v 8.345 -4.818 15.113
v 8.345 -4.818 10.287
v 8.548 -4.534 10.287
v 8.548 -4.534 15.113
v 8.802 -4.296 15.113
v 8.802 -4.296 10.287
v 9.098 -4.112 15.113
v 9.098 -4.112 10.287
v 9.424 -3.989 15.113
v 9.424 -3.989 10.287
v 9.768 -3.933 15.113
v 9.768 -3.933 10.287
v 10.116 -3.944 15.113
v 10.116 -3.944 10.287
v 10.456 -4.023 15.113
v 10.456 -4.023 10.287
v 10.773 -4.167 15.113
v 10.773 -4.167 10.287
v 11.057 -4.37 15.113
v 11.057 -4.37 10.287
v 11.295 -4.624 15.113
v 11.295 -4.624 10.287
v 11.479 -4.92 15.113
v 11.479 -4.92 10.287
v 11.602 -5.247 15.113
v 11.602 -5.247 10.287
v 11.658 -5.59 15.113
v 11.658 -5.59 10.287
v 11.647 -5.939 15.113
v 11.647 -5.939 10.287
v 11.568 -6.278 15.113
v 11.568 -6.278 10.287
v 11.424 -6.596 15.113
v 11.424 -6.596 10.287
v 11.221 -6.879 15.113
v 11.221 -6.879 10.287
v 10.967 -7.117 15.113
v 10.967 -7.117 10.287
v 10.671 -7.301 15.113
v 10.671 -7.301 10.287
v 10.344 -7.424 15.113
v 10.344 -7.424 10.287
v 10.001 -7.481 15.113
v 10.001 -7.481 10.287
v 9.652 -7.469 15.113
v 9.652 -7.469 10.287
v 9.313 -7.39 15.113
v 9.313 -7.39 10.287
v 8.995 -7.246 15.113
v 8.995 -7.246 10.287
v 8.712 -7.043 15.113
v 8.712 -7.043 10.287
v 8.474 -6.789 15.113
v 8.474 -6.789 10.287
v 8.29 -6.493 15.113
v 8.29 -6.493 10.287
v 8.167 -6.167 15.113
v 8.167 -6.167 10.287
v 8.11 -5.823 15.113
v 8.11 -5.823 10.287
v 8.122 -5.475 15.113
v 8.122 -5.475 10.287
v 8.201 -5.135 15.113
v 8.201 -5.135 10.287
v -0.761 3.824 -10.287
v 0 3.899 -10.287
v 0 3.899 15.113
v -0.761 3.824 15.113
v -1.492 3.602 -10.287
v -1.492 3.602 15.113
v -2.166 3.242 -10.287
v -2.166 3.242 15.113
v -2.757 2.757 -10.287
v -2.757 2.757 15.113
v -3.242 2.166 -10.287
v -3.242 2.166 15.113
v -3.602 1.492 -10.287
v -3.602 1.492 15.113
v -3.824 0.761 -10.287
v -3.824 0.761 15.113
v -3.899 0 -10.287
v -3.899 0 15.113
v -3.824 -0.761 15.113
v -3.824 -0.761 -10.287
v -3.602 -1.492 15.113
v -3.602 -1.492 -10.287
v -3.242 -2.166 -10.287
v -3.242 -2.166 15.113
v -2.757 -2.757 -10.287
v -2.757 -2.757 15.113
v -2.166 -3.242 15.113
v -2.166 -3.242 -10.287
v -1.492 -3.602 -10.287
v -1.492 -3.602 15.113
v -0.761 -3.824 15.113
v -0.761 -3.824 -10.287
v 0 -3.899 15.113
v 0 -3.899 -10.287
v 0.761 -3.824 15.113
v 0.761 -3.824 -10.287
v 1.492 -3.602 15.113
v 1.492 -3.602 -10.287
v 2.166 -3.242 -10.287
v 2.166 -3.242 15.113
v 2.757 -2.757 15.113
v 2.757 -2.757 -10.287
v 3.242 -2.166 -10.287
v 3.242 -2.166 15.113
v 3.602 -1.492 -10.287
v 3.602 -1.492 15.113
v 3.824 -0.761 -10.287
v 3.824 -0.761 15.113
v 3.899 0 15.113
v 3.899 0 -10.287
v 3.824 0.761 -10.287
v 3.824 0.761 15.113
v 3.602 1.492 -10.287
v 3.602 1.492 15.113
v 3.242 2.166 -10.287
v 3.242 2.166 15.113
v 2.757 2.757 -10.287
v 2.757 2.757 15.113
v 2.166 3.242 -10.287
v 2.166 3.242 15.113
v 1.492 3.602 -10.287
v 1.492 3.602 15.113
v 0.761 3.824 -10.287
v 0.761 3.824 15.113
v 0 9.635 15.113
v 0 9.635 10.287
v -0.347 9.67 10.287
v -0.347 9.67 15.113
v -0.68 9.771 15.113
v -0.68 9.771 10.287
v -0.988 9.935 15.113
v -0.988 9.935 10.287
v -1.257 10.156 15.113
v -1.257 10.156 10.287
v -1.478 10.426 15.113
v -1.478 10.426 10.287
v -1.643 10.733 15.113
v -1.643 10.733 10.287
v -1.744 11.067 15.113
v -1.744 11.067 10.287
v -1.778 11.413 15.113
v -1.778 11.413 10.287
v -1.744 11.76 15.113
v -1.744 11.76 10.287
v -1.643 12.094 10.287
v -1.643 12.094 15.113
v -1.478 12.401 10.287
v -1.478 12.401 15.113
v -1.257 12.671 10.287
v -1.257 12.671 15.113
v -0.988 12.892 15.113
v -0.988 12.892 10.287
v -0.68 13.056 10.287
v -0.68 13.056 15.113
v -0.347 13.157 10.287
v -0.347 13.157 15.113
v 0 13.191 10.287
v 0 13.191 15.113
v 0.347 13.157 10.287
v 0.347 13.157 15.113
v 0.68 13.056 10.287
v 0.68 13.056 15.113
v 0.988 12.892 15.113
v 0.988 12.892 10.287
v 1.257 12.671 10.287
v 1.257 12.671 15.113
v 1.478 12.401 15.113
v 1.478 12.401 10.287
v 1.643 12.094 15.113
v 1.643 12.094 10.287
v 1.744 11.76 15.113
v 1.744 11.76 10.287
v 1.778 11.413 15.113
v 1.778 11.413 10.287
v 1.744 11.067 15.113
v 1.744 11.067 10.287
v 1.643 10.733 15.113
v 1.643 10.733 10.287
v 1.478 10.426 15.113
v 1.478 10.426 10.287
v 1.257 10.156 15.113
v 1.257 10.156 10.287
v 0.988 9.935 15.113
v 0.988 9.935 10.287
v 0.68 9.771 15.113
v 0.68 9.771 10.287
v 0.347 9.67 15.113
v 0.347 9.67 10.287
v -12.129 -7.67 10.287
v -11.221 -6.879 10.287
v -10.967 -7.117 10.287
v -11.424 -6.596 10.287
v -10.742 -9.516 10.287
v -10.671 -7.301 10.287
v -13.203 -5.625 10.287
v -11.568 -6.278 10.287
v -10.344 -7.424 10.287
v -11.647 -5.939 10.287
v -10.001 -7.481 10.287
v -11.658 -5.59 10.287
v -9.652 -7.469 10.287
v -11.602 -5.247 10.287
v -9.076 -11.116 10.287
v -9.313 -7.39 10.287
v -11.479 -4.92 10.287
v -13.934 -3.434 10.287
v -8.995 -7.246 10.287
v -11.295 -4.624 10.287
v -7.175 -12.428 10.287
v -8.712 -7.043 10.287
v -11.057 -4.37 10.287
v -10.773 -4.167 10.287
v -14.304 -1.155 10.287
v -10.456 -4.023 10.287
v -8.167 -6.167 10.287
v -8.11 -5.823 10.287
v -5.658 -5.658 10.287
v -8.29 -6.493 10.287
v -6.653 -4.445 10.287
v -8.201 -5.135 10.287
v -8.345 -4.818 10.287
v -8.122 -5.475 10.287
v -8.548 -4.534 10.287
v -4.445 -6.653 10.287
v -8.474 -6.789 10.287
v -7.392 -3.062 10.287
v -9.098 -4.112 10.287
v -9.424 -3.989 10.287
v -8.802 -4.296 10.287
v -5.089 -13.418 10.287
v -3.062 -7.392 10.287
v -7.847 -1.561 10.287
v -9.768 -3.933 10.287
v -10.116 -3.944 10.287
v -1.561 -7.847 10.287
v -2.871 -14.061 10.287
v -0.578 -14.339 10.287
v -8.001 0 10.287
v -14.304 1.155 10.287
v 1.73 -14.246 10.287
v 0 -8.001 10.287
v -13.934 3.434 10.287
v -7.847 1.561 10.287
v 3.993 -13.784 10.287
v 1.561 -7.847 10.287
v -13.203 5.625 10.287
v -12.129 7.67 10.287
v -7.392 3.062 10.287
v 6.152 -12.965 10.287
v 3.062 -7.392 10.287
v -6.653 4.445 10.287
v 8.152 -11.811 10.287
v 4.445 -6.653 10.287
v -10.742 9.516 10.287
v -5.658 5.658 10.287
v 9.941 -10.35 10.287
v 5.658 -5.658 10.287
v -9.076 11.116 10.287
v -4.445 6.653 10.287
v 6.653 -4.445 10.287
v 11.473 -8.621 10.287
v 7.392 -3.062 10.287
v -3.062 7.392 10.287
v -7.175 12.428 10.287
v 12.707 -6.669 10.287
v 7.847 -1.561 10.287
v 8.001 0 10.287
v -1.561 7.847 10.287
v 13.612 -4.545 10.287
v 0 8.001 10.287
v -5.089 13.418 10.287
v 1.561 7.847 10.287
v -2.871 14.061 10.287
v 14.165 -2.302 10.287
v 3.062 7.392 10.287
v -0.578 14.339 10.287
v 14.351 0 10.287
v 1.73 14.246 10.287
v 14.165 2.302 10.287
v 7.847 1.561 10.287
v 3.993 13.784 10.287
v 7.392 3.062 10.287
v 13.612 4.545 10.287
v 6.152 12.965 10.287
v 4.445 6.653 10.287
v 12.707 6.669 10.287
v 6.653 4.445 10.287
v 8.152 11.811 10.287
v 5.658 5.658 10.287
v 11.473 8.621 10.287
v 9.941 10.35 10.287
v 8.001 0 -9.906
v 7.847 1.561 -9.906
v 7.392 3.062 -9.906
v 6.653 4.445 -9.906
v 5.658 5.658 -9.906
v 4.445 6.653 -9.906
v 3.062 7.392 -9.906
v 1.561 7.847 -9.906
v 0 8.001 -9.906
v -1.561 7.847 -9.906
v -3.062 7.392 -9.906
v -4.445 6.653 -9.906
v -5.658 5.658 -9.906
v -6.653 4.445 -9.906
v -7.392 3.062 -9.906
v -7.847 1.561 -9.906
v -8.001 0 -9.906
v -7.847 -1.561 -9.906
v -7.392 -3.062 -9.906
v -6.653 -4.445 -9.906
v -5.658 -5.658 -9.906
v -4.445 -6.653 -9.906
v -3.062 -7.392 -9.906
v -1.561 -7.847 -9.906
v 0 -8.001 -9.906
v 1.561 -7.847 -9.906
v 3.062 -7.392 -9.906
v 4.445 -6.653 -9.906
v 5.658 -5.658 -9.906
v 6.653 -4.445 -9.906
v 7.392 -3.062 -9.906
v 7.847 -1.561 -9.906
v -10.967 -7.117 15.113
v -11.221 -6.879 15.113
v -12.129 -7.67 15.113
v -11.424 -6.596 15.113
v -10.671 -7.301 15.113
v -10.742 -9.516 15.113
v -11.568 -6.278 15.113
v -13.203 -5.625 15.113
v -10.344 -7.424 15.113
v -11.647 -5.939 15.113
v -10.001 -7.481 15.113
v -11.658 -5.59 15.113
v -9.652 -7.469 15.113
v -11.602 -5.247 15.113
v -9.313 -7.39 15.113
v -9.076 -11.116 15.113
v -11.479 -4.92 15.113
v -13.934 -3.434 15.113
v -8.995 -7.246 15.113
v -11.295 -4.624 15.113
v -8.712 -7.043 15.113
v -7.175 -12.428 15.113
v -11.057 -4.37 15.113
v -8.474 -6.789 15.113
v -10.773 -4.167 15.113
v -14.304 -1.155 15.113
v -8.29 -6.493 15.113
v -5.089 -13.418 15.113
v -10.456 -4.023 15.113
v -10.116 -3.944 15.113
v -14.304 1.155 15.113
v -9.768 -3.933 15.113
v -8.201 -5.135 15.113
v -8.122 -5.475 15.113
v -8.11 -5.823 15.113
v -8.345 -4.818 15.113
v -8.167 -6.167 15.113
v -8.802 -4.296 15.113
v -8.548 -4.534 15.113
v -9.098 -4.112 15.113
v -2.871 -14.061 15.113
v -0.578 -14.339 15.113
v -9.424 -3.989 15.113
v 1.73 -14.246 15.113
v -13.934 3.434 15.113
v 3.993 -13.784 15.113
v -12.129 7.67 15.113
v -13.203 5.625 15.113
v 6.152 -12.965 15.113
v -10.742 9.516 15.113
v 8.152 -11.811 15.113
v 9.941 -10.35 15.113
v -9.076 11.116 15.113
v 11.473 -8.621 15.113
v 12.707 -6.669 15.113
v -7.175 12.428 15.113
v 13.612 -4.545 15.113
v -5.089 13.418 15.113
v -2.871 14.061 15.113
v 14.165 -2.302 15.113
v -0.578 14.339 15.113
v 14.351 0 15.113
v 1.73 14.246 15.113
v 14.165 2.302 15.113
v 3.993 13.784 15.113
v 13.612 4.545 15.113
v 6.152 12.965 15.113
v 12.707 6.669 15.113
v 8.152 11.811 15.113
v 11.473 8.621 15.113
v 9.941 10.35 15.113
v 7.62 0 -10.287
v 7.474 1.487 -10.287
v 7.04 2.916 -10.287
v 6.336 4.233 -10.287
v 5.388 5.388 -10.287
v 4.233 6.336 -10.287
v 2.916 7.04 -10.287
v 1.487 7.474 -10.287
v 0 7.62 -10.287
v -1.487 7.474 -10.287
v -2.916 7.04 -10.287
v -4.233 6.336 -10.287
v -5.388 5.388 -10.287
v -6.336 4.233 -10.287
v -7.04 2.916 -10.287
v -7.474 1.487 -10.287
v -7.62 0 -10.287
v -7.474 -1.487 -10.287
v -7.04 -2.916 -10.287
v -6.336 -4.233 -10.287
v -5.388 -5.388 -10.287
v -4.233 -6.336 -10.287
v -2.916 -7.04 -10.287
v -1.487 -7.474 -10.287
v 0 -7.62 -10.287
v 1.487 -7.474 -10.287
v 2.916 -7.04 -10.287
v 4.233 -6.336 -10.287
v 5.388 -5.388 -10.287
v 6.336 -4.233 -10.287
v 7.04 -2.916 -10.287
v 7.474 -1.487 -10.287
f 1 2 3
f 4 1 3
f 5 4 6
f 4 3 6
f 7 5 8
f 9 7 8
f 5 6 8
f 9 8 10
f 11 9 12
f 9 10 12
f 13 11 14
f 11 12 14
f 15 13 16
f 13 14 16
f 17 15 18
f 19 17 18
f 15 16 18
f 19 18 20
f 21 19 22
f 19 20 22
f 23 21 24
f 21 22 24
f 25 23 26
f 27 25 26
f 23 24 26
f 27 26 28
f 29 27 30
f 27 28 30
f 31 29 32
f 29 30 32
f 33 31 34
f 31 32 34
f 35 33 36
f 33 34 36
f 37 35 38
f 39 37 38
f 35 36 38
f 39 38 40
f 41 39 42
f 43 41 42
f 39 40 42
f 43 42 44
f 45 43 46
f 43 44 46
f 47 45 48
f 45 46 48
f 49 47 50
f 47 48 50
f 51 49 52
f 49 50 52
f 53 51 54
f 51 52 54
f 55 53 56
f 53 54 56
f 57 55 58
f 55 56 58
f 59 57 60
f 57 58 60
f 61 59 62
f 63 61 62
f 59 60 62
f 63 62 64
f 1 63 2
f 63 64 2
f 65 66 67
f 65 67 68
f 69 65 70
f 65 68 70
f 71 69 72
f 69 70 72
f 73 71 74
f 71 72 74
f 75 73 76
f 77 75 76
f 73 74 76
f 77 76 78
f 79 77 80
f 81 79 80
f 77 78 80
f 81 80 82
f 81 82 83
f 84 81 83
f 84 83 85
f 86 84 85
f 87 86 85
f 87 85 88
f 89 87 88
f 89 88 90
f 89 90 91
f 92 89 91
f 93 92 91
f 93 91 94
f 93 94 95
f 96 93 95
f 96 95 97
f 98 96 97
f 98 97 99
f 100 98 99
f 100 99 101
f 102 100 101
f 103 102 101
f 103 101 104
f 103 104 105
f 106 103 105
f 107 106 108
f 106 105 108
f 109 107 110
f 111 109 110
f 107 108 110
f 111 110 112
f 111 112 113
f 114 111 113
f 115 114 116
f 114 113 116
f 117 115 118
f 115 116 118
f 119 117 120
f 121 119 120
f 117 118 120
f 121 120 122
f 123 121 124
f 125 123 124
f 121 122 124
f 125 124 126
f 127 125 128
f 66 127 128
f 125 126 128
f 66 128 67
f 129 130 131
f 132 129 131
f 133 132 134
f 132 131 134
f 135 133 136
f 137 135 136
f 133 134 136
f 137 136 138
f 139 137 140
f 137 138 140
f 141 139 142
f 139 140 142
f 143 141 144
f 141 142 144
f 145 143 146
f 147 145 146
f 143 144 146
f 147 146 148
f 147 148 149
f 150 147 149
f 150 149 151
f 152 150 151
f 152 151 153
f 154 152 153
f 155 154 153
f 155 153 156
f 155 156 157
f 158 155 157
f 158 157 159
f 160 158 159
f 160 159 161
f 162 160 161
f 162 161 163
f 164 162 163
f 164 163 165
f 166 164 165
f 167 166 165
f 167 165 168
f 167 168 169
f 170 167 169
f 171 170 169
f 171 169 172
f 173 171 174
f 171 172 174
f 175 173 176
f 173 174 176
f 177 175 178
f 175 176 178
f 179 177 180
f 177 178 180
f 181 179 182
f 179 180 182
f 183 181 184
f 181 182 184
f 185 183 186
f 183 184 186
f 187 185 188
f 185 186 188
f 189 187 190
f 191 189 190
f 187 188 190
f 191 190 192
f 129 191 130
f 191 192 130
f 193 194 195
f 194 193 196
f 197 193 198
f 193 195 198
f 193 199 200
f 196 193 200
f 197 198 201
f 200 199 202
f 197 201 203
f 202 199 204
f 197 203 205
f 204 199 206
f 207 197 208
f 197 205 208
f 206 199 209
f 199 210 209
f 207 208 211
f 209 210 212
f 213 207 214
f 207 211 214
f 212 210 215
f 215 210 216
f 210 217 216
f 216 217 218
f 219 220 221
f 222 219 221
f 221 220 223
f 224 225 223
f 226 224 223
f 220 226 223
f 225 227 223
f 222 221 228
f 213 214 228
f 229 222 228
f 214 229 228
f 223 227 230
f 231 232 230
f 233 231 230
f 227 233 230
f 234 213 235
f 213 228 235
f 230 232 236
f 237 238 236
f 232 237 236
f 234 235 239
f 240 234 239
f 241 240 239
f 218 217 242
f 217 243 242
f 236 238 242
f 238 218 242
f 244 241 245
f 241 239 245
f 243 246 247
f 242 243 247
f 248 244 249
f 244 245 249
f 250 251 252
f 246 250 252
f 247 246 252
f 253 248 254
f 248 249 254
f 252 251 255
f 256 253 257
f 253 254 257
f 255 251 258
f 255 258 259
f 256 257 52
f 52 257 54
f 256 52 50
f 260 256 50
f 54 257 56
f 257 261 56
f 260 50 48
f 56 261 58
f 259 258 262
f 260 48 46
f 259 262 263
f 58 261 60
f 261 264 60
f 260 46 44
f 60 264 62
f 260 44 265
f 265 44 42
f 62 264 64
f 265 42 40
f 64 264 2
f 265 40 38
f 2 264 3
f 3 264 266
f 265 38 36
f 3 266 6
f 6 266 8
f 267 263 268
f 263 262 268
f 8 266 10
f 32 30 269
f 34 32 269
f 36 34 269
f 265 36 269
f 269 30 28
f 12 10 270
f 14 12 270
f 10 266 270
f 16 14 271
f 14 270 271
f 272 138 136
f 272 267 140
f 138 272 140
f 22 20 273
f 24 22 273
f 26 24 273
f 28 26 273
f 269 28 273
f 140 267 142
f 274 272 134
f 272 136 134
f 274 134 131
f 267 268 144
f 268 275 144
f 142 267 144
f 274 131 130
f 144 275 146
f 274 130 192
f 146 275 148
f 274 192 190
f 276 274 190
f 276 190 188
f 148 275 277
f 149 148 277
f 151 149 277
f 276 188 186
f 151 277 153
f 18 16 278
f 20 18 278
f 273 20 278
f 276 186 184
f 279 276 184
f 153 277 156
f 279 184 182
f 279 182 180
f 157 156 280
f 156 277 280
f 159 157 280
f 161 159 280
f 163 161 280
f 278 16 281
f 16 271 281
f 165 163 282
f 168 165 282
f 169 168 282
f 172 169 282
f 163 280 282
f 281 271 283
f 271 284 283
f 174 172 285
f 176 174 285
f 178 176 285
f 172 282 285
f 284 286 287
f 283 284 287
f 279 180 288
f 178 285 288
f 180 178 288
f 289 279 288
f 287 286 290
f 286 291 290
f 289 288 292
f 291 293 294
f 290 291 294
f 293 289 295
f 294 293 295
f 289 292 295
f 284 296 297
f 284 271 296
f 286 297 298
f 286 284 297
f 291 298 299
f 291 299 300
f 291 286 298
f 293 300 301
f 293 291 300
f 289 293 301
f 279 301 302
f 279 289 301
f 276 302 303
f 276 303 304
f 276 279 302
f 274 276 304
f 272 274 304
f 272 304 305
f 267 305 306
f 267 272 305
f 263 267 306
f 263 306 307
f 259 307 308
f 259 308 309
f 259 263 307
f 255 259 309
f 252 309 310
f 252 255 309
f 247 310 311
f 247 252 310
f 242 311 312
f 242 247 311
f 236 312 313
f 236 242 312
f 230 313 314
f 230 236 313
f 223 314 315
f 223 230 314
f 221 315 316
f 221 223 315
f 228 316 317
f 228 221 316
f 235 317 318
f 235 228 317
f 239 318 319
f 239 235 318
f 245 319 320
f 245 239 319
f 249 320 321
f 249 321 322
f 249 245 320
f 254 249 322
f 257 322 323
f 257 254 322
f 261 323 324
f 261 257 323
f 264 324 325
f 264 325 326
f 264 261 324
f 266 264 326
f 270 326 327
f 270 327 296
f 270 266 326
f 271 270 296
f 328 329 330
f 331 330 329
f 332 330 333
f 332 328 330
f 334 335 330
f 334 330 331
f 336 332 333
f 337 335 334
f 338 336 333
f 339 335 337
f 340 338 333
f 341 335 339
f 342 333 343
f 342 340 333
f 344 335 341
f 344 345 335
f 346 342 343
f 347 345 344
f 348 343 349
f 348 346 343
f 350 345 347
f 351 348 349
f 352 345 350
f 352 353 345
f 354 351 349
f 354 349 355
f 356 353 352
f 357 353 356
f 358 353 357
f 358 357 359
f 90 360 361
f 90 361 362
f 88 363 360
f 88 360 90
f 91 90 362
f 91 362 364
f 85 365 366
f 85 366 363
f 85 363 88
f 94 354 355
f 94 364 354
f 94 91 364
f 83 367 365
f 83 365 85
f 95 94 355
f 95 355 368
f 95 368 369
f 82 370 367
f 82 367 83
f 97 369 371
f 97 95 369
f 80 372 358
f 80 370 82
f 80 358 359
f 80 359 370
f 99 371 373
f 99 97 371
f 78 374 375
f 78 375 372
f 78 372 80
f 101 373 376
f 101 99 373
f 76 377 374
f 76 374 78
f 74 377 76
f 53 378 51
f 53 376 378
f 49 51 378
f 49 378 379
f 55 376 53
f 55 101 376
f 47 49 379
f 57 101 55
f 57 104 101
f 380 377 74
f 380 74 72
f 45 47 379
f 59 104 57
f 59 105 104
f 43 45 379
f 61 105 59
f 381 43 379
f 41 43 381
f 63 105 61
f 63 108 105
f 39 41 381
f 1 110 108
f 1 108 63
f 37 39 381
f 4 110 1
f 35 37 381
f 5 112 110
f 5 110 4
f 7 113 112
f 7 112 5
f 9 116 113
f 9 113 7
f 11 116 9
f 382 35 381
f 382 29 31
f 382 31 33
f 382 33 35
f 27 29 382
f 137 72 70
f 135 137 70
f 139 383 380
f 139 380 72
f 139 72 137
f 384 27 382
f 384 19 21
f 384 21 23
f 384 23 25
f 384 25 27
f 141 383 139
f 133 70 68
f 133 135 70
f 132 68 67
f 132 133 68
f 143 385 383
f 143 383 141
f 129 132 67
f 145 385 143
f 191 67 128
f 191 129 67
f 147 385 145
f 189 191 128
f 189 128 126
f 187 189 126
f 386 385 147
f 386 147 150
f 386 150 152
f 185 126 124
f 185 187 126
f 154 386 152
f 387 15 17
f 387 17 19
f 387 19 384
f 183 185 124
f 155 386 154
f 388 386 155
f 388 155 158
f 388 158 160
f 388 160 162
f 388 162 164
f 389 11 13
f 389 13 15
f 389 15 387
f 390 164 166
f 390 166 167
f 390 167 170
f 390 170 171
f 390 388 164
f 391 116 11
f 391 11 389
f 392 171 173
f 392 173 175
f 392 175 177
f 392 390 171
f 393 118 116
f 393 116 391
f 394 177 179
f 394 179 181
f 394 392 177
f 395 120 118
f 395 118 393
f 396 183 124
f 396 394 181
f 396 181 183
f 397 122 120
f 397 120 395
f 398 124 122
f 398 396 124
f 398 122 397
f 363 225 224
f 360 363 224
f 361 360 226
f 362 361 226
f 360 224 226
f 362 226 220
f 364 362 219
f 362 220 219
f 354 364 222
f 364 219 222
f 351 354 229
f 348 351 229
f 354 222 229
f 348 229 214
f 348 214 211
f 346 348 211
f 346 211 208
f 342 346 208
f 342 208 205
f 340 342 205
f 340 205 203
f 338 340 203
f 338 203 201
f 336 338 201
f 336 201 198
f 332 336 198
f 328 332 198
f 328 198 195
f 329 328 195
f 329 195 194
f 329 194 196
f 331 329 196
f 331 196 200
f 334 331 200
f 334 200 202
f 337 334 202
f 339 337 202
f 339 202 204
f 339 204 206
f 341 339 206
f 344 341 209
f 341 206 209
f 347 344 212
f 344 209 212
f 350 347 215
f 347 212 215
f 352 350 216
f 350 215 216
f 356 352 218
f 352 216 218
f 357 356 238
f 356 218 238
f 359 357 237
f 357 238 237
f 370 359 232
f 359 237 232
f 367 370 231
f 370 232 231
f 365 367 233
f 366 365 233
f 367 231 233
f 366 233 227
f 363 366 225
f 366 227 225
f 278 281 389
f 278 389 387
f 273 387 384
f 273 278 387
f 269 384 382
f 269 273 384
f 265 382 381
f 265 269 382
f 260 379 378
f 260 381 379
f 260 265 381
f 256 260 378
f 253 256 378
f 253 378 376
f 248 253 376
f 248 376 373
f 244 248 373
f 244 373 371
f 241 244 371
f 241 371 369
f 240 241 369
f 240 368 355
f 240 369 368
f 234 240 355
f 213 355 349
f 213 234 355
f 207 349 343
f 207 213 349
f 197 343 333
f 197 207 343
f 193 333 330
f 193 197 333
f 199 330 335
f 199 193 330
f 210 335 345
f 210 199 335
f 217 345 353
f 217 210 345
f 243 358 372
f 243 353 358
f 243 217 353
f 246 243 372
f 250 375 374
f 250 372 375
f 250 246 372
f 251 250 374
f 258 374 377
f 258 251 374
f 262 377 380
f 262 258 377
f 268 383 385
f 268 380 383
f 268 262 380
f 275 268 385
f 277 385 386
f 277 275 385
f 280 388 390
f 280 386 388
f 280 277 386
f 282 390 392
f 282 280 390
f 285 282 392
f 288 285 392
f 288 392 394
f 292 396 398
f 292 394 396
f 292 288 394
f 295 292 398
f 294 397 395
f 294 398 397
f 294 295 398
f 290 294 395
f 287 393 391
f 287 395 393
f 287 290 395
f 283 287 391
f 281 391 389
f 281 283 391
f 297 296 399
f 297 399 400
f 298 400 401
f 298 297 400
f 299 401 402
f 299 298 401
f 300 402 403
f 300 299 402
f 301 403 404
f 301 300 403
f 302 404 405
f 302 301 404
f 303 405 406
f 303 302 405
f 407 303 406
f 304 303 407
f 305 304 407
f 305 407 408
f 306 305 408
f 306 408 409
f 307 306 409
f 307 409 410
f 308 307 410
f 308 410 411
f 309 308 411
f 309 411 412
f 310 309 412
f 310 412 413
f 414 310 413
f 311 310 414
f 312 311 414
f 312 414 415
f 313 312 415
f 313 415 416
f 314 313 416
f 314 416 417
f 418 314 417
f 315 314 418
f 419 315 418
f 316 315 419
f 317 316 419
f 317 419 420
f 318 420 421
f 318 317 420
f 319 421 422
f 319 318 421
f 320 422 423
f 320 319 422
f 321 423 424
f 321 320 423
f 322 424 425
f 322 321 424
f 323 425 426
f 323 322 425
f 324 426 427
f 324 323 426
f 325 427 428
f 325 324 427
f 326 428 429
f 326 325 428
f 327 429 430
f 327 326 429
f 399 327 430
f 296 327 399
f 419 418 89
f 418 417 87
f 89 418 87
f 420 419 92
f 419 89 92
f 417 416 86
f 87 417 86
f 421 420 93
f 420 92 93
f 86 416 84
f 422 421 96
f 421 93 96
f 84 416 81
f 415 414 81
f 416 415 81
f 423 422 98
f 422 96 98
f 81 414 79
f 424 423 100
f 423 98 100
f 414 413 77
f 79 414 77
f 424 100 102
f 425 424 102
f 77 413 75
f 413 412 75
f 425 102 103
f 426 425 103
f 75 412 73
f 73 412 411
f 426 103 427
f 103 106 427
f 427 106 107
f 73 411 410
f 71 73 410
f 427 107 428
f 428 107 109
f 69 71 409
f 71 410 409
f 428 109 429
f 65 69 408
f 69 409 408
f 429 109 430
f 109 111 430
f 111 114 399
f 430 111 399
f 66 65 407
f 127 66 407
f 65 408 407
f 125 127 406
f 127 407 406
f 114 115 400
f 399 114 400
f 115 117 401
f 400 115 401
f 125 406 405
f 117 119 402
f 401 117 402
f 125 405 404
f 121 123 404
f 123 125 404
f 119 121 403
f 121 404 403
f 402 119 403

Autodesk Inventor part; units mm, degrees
ref_plane "YZ Plane" through (0, 0, 0) normal (1, 0, 0) x (0, 1, 0)
ref_plane "XZ Plane" through (0, 0, 0) normal (0, 1, 0) x (-1, 0, 0)
ref_plane "XY Plane" through (0, 0, 0) normal (0, 0, 1) x (1, 0, 0)
sketch "Sketch1" plane through (0, 0, 0) normal (0, 0, 1) x (1, 0, 0)
  circle A0 centre (0, 0) radius 8.001
  dimension "d0" = 16.002
extrude "Extrusion1" add sketch "Sketch1" along normal mid plane 20.574
sketch "Sketch2" plane through (0, 0, 10.287) normal (0, 0, 1) x (1, 0, 0)
  circle A0 centre (0, 0) radius 8.001 projected
  circle A1 centre (0, 0) radius 14.351
  dimension "d29" = 28.702
extrude "Extrusion2" add sketch "Sketch2" along normal blind 4.826 contours A0 | A1
sketch "Sketch4" plane through (0, 0, -10.287) normal (0, 0, -1) x (-1, 0, 0)
  circle A0 centre (0, 0) radius 8.001 projected
hole "Hole2" at (0, 0, -10.287) direction (0, 0, 1) diameter 7.7978 end through all thread size "3/8-16 UNC" class "2B" standard "ANSI Unified Screw Threads"
chamfer "Chamfer1" distance 0.381 angle 45 1 edges at (-8.001, 0, -10.287)
sketch "Sketch6" plane through (0, 0, 15.113) normal (0, 0, 1) x (1, 0, 0)
  circle A0 centre (0, 0) radius 14.351 projected
  circle A1 centre (0, 0) radius 11.4134 construction
  point P0 (0, 11.4134)
hole "Hole3" at (0, 11.4134, 15.113) direction (0, 0, -1) diameter 3.556 end through all
pattern_circular "Circular Pattern1" count 3 over 360 about axis through (0, 0, 10.287) along (0, 0, 1) of "Hole3"
properties part number "LeadScrewNut" material "ABS Plastic"
